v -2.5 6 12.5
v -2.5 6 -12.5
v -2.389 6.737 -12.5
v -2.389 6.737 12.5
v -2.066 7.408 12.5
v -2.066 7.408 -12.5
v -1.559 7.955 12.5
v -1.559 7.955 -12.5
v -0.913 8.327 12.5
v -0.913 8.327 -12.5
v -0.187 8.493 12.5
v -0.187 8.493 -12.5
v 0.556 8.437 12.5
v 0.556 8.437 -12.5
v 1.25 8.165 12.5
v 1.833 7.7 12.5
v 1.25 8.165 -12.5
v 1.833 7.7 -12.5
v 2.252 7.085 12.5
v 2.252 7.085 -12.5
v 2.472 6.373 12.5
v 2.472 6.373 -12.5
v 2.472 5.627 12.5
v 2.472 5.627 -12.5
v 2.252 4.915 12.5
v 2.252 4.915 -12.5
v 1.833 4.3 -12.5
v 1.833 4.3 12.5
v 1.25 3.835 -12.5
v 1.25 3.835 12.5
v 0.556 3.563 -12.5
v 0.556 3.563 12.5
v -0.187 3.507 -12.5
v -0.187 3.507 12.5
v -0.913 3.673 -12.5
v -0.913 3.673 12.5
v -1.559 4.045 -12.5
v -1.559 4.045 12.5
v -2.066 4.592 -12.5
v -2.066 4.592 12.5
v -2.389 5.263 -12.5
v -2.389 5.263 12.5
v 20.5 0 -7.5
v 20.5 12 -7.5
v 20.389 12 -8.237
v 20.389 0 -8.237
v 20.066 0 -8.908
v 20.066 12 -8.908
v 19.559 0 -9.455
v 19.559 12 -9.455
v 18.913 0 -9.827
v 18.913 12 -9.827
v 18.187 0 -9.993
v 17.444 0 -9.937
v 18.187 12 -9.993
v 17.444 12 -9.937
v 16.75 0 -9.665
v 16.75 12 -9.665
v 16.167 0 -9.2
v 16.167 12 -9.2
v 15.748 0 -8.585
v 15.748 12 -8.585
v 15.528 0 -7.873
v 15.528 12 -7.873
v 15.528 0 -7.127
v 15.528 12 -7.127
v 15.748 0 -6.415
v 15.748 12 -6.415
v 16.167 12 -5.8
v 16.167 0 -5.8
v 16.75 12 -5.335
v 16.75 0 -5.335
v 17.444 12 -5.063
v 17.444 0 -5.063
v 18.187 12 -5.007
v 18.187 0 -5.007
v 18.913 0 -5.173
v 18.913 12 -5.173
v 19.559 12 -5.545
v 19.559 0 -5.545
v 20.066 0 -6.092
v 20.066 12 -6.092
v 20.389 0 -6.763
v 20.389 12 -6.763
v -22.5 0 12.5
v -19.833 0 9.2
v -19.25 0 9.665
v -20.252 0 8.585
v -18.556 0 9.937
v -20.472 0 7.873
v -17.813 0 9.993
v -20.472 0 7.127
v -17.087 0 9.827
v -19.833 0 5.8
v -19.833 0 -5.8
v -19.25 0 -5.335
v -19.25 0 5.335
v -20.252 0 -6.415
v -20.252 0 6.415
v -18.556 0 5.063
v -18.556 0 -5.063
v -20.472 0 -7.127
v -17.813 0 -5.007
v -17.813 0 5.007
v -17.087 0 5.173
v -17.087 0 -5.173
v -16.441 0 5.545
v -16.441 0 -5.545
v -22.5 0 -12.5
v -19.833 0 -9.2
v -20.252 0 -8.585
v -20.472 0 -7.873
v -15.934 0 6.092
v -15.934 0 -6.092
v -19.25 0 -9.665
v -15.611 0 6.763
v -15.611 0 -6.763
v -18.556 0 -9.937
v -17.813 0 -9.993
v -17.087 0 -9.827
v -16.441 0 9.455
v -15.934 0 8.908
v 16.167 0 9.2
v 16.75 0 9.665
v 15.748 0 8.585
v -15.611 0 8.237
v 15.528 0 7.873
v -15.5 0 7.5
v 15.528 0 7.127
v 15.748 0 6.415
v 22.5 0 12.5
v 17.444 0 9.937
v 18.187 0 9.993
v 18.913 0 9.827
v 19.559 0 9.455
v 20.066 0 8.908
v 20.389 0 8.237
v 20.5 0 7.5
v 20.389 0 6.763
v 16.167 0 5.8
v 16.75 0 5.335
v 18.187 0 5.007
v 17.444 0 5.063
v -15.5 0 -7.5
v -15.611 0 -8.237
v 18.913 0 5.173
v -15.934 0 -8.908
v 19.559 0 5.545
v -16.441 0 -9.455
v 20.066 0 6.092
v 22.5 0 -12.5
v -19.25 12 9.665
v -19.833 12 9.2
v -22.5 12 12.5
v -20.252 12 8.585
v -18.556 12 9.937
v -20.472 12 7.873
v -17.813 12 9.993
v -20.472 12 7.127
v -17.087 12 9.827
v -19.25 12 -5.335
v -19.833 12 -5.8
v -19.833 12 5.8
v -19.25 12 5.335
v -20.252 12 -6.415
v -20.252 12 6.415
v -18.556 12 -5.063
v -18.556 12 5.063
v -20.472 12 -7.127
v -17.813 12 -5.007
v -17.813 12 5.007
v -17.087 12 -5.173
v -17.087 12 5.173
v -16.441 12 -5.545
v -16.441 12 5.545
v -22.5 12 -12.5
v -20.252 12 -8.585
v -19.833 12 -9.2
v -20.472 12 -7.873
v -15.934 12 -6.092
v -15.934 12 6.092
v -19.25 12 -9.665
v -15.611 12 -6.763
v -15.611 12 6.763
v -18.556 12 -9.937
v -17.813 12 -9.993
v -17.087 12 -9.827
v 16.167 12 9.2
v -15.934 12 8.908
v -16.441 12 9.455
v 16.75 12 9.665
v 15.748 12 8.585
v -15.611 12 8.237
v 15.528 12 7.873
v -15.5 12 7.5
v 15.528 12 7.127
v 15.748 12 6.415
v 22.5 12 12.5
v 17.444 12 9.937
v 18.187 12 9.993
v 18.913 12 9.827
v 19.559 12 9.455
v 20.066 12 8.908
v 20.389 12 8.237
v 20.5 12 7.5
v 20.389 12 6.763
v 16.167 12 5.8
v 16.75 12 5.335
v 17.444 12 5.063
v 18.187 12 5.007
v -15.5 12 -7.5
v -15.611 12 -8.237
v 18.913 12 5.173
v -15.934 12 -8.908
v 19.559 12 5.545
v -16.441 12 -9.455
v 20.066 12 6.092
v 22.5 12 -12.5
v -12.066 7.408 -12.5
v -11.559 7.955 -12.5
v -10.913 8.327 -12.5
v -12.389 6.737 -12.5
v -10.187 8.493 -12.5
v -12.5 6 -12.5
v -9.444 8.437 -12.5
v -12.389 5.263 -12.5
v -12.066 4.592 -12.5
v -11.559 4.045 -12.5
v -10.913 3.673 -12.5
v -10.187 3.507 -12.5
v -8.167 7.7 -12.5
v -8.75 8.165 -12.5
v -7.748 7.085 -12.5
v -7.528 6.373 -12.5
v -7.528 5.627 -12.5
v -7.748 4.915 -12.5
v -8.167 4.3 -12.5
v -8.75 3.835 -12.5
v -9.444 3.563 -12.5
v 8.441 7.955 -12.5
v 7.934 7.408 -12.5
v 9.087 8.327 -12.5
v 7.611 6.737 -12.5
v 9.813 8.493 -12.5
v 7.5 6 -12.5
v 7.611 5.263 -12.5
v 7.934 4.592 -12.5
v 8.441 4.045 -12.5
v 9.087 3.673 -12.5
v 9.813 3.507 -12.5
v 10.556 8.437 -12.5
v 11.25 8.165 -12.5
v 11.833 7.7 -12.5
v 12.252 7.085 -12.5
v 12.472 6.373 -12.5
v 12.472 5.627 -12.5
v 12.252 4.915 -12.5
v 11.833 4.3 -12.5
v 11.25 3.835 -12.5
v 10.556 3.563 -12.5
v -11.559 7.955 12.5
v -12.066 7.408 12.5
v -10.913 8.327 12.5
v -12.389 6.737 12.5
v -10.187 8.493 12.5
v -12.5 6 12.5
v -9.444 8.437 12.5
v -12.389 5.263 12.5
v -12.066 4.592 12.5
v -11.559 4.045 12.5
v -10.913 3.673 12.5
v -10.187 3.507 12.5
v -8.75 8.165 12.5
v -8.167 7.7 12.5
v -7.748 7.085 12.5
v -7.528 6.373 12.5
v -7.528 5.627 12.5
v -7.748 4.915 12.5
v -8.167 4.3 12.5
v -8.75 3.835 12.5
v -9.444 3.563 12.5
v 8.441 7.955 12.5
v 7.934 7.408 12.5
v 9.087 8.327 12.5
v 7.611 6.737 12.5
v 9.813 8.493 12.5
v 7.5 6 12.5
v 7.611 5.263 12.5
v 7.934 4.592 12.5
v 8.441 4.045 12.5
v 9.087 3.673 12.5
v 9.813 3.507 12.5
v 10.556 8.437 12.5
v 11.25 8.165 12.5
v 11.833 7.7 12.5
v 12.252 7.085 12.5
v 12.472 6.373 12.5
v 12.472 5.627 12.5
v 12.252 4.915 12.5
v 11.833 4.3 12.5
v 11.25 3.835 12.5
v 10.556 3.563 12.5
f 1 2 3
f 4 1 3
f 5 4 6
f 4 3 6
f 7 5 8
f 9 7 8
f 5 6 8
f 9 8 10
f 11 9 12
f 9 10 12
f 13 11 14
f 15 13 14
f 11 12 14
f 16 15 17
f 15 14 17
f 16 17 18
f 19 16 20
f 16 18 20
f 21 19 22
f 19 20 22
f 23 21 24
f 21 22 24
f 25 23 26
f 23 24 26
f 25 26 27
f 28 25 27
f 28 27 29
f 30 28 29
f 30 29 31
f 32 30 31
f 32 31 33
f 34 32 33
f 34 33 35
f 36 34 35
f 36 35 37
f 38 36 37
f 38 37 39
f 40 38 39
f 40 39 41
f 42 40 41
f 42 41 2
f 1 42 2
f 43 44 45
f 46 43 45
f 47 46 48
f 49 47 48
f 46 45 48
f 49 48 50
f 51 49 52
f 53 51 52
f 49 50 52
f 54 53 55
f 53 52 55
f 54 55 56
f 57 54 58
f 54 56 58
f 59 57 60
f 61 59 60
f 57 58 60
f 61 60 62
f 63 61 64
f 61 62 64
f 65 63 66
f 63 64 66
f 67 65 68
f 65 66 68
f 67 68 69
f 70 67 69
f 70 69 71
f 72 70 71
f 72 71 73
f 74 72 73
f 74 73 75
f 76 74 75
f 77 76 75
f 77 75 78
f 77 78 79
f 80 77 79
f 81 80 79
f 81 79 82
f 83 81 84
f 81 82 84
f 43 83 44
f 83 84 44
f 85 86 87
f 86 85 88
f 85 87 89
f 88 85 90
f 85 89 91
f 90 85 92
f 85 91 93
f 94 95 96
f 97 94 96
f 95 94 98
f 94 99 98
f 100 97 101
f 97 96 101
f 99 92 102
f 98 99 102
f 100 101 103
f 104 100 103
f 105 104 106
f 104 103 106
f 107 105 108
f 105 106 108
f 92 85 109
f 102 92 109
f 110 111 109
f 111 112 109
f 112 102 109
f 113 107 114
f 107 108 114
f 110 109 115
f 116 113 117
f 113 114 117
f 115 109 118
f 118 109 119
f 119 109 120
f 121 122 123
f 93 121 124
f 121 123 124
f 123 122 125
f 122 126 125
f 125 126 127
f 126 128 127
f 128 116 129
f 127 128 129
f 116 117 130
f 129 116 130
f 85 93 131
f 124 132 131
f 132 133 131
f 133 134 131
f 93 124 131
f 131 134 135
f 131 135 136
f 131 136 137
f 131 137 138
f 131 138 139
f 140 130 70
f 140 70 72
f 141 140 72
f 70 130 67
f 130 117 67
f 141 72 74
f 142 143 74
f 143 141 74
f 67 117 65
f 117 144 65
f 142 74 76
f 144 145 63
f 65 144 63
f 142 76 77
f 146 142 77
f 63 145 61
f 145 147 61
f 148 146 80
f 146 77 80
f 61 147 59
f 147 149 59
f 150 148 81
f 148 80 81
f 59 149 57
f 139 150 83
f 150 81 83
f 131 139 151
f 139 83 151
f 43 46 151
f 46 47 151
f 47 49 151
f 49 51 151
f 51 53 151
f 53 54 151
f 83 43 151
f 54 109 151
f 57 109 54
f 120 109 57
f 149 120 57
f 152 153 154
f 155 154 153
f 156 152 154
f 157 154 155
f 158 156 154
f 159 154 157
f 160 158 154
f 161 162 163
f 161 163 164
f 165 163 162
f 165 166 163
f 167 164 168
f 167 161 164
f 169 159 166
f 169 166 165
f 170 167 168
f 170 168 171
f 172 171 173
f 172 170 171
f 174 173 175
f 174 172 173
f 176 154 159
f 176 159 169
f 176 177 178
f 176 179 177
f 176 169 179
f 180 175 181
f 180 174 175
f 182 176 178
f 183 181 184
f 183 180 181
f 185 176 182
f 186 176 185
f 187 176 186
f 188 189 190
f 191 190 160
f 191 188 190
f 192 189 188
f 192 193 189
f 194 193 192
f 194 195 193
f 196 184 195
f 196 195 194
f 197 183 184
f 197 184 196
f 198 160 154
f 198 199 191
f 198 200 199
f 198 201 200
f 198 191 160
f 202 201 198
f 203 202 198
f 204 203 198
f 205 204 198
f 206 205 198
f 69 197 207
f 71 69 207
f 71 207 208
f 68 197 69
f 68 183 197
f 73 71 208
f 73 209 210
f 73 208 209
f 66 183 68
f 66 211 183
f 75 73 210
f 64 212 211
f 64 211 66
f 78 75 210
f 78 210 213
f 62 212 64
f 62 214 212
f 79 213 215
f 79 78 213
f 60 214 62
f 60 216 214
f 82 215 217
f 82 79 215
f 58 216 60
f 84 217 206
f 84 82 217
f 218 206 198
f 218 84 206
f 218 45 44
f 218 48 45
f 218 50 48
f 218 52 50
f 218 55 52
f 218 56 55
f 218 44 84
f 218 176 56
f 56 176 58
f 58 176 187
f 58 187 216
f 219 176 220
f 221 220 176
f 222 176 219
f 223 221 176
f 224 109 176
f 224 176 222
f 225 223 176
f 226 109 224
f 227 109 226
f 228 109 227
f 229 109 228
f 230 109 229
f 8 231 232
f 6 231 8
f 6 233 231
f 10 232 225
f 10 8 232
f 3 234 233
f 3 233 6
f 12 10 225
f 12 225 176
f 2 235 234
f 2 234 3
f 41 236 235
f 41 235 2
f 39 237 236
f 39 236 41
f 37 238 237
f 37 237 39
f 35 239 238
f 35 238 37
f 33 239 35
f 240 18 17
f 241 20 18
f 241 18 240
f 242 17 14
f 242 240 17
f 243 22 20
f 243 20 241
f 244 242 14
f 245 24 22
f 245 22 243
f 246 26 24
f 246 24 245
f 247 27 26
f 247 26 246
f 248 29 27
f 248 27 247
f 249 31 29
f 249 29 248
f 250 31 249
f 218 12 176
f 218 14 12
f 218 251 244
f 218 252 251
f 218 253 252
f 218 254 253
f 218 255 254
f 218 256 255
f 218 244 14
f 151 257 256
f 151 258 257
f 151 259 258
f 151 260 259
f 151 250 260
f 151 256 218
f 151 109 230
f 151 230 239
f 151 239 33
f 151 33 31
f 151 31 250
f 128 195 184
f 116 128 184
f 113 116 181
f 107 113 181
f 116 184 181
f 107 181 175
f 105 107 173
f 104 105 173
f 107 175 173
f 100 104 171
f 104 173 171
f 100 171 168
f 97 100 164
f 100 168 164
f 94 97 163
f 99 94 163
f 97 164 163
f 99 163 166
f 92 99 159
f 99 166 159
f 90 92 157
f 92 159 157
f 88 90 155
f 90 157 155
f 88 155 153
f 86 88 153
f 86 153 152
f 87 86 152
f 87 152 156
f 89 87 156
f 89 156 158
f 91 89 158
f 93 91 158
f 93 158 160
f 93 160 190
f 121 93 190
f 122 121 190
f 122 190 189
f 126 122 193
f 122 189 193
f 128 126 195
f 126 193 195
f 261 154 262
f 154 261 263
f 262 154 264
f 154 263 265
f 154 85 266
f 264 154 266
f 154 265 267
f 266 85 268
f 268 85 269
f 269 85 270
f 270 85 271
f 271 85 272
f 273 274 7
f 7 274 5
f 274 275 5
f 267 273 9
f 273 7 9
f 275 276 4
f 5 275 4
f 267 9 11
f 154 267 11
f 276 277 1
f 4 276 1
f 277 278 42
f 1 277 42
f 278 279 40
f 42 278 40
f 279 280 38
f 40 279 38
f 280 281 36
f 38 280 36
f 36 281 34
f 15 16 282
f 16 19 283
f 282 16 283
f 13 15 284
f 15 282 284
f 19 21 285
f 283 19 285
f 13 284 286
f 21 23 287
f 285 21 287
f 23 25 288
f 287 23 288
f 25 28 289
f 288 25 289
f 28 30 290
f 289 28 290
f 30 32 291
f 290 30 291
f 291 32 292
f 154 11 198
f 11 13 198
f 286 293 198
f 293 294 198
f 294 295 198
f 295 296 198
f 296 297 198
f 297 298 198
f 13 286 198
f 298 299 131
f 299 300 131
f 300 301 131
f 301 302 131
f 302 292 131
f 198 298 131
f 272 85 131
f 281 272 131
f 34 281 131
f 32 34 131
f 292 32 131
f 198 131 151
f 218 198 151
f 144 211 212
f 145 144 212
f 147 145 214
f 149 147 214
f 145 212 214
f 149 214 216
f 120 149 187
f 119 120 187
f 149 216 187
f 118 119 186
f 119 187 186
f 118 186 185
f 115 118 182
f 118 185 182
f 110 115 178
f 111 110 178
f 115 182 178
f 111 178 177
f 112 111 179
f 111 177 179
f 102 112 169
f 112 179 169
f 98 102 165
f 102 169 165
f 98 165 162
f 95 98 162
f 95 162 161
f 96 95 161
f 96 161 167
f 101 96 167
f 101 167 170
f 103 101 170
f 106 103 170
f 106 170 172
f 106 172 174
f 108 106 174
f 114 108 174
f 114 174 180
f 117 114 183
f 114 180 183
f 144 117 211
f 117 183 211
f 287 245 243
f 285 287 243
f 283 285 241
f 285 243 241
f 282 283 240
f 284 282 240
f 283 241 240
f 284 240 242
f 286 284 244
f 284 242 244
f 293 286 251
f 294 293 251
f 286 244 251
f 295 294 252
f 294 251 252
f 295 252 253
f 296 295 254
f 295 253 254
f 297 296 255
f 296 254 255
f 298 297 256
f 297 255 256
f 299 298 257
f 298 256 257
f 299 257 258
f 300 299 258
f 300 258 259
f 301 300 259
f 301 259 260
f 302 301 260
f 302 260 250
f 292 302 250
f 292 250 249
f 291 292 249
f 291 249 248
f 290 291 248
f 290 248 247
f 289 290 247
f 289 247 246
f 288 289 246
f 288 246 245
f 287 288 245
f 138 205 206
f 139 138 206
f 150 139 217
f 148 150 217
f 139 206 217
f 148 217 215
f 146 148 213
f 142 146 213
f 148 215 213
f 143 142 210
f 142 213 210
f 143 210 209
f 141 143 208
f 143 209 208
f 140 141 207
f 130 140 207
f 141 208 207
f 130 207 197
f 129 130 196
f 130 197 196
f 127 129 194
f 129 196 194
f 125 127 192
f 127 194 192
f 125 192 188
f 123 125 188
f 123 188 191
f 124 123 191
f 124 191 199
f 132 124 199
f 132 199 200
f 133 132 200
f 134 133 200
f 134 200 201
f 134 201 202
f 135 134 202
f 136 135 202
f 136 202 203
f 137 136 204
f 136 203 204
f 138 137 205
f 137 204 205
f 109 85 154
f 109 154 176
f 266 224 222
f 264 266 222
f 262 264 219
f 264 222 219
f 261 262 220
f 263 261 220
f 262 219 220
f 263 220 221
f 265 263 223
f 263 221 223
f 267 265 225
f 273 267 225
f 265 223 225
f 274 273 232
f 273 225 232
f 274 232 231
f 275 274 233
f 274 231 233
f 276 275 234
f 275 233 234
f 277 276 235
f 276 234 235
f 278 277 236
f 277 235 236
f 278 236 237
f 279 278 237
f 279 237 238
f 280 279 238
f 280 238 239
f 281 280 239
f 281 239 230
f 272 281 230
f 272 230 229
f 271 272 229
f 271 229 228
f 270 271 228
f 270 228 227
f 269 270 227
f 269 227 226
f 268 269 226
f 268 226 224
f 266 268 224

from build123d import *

# Parameters (mm, degrees)
SKETCH1_W           = 45
SKETCH1_H           = 25
BOSS_EXTRUDE1_DEPTH = 12
SKETCH2_R           = 2.5
CUT_EXTRUDE1_DEPTH  = 12
SKETCH3_R           = 2.5
CUT_EXTRUDE2_DEPTH  = 72
SKETCH4_R           = 2.5
CUT_EXTRUDE3_DEPTH  = 72


with BuildPart() as part:
    # Sketch1 → Boss-Extrude1 (new body)
    with BuildSketch(Plane(origin=(0, 0, 0), x_dir=(1, 0, 0), z_dir=(0, 1, 0))):
        Rectangle(SKETCH1_W, SKETCH1_H)
    extrude(amount=BOSS_EXTRUDE1_DEPTH)

    # Sketch2 → Cut-Extrude1 (cut)
    with BuildSketch(Plane(origin=(0, 12, 0), x_dir=(1, 0, 0), z_dir=(0, 1, 0))):
        with Locations((-18, -7.5)):
            Circle(SKETCH2_R)
        with Locations((-18, 7.5)):
            Circle(SKETCH2_R)
        with Locations((18, -7.5)):
            Circle(SKETCH2_R)
        with Locations((18, 7.5)):
            Circle(SKETCH2_R)
    extrude(amount=-CUT_EXTRUDE1_DEPTH, mode=Mode.SUBTRACT)

    # Sketch3 → Cut-Extrude2 (cut)
    with BuildSketch(Plane(origin=(0, 0, -12.5), x_dir=(-1, 0, 0), z_dir=(0, 0, -1))):
        with Locations((0, 6)):
            Circle(SKETCH3_R)
    extrude(amount=-CUT_EXTRUDE2_DEPTH, mode=Mode.SUBTRACT)

    # Sketch4 → Cut-Extrude3 (cut)
    with BuildSketch(Plane(origin=(0, 0, -12.5), x_dir=(-1, 0, 0), z_dir=(0, 0, -1))):
        with Locations((10, 6)):
            Circle(SKETCH4_R)
        with Locations((-10, 6)):
            Circle(SKETCH4_R)
    extrude(amount=-CUT_EXTRUDE3_DEPTH, mode=Mode.SUBTRACT)


solid = part.part
